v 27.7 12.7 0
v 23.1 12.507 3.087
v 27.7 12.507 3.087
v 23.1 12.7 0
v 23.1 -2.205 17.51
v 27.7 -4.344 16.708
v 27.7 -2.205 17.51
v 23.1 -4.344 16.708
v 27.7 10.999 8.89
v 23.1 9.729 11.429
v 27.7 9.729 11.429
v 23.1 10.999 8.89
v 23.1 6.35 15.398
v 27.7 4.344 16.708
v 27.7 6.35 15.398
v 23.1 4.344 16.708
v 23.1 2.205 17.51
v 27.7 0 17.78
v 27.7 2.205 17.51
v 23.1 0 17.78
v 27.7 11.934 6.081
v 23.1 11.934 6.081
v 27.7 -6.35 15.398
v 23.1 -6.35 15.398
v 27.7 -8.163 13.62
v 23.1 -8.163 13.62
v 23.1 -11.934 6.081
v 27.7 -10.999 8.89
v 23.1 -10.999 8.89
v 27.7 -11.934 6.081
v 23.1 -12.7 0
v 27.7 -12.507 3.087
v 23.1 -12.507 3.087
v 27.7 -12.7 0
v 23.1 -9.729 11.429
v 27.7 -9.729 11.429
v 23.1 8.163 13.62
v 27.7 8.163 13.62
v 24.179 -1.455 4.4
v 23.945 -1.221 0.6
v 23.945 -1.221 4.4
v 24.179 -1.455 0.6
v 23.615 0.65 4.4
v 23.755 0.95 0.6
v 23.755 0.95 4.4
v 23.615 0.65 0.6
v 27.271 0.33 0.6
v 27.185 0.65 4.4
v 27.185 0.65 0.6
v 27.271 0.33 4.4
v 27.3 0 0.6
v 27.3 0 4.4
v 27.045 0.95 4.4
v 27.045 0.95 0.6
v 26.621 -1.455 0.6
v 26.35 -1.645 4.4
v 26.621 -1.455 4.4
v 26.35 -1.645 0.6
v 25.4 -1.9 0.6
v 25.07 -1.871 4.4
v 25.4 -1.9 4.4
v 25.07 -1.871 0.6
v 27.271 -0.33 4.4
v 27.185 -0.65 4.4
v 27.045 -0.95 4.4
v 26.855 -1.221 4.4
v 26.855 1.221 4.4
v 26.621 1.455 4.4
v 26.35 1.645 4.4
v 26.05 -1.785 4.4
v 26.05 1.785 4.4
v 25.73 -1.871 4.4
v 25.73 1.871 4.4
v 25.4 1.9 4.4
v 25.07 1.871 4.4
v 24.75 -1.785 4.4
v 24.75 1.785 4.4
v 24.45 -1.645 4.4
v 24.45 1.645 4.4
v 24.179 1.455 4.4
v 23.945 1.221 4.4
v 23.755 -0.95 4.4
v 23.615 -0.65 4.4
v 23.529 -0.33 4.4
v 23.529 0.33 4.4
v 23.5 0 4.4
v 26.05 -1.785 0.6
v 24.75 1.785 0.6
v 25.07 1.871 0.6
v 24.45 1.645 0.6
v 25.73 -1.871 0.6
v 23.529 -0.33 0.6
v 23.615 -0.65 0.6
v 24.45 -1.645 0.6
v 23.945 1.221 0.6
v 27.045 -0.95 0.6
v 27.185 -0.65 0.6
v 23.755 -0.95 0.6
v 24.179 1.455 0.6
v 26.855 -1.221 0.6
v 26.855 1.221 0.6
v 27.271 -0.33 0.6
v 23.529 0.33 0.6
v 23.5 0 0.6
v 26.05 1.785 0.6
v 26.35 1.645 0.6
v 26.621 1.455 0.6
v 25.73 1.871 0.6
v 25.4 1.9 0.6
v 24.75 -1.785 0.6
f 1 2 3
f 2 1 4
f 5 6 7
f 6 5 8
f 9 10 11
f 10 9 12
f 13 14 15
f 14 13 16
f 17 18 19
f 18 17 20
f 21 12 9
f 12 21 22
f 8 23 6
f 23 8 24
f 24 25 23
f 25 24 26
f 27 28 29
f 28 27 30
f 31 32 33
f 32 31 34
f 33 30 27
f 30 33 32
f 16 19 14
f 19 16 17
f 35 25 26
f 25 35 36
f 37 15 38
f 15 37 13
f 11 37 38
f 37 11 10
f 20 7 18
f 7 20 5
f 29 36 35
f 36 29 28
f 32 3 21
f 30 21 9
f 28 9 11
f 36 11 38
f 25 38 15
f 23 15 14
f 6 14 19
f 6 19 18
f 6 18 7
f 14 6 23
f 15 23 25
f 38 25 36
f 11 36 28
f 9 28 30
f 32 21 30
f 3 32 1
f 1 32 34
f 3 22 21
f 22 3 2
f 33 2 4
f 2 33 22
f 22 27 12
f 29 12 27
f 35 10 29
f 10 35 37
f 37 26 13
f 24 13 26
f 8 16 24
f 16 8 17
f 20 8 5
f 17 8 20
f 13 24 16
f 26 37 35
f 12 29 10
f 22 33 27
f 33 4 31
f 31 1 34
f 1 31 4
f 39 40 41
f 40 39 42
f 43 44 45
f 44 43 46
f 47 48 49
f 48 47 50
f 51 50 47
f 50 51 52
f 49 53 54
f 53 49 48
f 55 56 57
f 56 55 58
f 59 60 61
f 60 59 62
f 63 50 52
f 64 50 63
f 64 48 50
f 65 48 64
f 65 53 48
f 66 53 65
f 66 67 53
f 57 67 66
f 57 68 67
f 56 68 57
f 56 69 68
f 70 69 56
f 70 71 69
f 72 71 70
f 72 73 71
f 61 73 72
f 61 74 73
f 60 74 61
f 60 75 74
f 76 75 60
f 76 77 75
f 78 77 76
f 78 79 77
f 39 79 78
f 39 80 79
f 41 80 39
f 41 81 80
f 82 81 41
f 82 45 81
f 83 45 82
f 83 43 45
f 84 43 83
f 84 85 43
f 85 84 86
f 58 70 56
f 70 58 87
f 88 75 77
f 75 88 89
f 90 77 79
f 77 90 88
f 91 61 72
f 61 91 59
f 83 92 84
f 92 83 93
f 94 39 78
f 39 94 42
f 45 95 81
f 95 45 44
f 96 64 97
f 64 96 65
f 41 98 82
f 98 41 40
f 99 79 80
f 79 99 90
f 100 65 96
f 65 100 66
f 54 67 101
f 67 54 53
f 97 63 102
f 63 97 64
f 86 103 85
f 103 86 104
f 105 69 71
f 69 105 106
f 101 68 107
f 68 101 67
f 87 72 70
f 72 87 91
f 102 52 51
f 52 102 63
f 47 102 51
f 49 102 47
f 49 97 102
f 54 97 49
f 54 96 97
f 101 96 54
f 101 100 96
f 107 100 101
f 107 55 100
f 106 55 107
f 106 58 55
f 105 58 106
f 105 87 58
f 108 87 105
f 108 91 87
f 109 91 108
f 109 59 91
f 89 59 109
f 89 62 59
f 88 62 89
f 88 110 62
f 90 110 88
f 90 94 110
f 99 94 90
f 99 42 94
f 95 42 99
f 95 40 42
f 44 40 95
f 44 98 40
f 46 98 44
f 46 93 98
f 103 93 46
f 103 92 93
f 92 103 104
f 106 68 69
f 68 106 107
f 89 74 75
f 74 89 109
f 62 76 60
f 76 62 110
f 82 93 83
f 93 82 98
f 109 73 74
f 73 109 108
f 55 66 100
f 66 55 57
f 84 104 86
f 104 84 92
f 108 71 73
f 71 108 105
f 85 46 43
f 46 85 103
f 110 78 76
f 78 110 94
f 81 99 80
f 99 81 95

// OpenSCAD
// file: cadence.scad
// cadence eaabadf.scad
// https://github.com/jmettraux/cadence.scad


// as of 2019.05, OpenSCAD understands
// is_num, is_list, is_string, and, is_bool
//
// is_function is coming, but looks tricky



function _normalize_angle(a) =
  ((a >= 0 && a <= 360) ? a : _normalize_angle(a + (a < 0 ? 360 : -360)));


function _is_point(p) =
  is_list(p) && len(p) == 3 && is_num(p.x) && is_num(p.y) && is_num(p.z);


//
// dictionary functions

function _aaget(dict, key, default, off) =
  let (kv = dict[off])
    kv == undef ? default :
    kv[0] == key ? kv[1] :
      _aaget(dict, key, default, off + 1);

function _asget(dict, key, default, off) =
  dict[off] == undef ? default :
  dict[off] == key ? dict[off + 1] :
    _asget(dict, key, default, off + 2);

function _get(dict, key, default=undef) =
  is_string(dict[0]) ?
    _asget(dict, key, default, 0) :
    _aaget(dict, key, default, 0);

function _del(dict, key) =
  [ for (kv = dict) if (kv[0] != key) kv ];

function _put(dict, key, value) =
  concat(_del(dict, key), [ [ key, value ] ]);


function _assoc(arr, key, default, off=0) =
  let (a = arr[off])
  a == undef ? default :
  a[0] == key ? a :
  _assoc(arr, key, default, off + 1);

function _app(arr, entry) =
  concat(_del(arr, entry[0]), [ entry ]);


//
// list functions

function _idx(list, index, default=undef) =
  let (
    i = index < 0 ? len(list) + index : index,
    r = list[i]
  )
  r == undef ? default : r;

  // sublist
  //
function _slist(list, from=0, to) =
  let(
    li = len(list) - 1,
    end = (to == undef ? li : to),
    a0 = from < 0 ? li + 1 + from : from,
    a = a0 < 0 ? 0 : a0,
    z = end < 0 ? li + 1 + end : end
  )
    a > li ? [] :
    z < a ? [] :
      [ for (i = [a:z]) list[i] ];

function _reverse(list) =
  [ for (i = [ len(list) - 1 : -1 : 0 ]) list[i] ];


//
// string functions

function _sstr(s, from=0, length=undef, r="") =
  let(
    i = from < 0 ? len(s) + from : from,
    l = length == undef ? len(s) : length,
    s0 = s[i]
  )
  (s0 == undef || l < 1) ? r :
  str(r, s[i], _sstr(s, i + 1, l - 1));

function _sindex(s, s1, i=0) =
  let(
    l = len(s1),
    s0 = _sstr(s, i, l)
  )
  len(s0) < l ? undef :
  s0 == s1 ? i :
  _sindex(s, s1, i + 1);


function _ends_with(l, l1)=
  is_string(l) ? (_sstr(l, len(l) - len(l1)) == l1) :
  is_list(l) ? (_slist(l, len(l) - len(l1)) == l1) :
  false;


//
// point functions

  // Accept a single angle instead of [ angle0, angle1 ]
  // 'sp' is the start point
  //
function _to_point(length, angles, sp=[ 0, 0, 0 ]) =
  let(
    as = is_num(angles) ? [ angles, 0 ] : angles,
    inclination = as[0],
    azimuth = as[1] + 90
  )
    sp + [
      length * cos(inclination) * cos(azimuth),
      length * cos(inclination) * sin(azimuth),
      length * sin(inclination) ];

function _to_spherical(point) =
  let(
    l = norm(point),
    ele = asin(point.z / l),
    dir = atan2(point.y, point.x) - 90
  )
    [ l, [ ele, dir ] ];

function _to_spherical_xyz(point) =
  let(
    l = norm(point),
    ele = asin(point.z / l),
    dir = atan2(point.y, point.x) - 90
  )
    [ l, ele, dir ];

function _to_ele_dir(point) =
  let(
    ele = asin(point.z / l),
    dir = atan2(point.y, point.x) - 90
  )
    [ ele, dir ];


function _midpoint(p0, p1, ratio=0.5) =
  let(
    s = _to_spherical(p1 - p0)
  )
    _to_point(ratio * s[0], s[1], p0);

//function _vlen(vector) =
//  sqrt(pow(vector.x, 2) + pow(vector.y, 2) + pow(vector.z, 2));
  //
  // no, use norm(vector)


// Like rotate(rotation) { x }, but as a function, applied to a single point
//
function rotate_point(point, rotation)=
  let (
    r = rotation,
    m =
      [ [ 1, 0, 0 ], [0, cos(r.x), -sin(r.x) ], [ 0, sin(r.x), cos(r.x) ] ] *
      [ [ cos(r.y), 0, sin(r.y) ], [ 0, 1, 0 ], [ -sin(r.y), 0, cos(r.y) ] ] *
      [ [ cos(r.z), -sin(r.z), 0 ], [ sin(r.z), cos(r.z), 0 ], [ 0, 0, 1 ] ]
  )
  m * point;


// inspiration:
// https://climberg.de/post/openscad_bezier_curves_of_any_degrees

function _bezier_choose(n, k) =
  k == 0 ?  1 : (n * _bezier_choose(n - 1, k - 1)) / k;

function _bezier_point(points, t, i, c) =
  len(points) == i ?
    c :
    _bezier_point(
      points,
      t,
      i + 1,
      c +
        _bezier_choose(len(points) - 1, i) *
        pow(t, i) *
        pow(1 - t, len(points) - i - 1) * points[i]);

function _bezier_points(control_points, sample_count) =
  [ for (t = [ 0 : 1.0 / sample_count : 1 ])
    _bezier_point(control_points, t, 0, [ 0, 0, 0 ]) ];


//
// modules

module polypoints(points) {

  for (i = [ 0 : len(points) - 1 ]) {
    translate(points[i]) children(i % $children);
  }
}

module polyhulls(points) {

  for (i = [ 0 : len(points) - 2 ]) {

    hull() {
      translate(points[i]) children(i % $children);
      translate(points[i + 1]) children((i + 1) % $children);
    }
  }
}


// pineapple slice
//
module paslice(radius, depth, slice=45, radius1=0) {

  s = _normalize_angle(slice);
  r = radius;

  if (s > 0) difference() {

    cylinder(depth, r=r);

    translate([ 0, 0, -0.1 ]) cylinder(depth * 1.1, r=radius1);

    if (s != 360) {

      pas = [
        [ 0, r ], [ 0, 0 ] ];
      pbs = [
        [ r, r ], [ r, 0 ], [ r, -r ], [ 0, -r ], [ -r, -r ], [ -r, 0 ],
        [ -r, r ] ];

      t = tan(s);
      tx = t * r;
      ty = r / t;

      translate([ 0, 0, -0.1 ]) linear_extrude(depth + 0.2)
        if (s <= 45)
          polygon(concat(pas, [ [ tx, r ] ], pbs));
        else if (s <= 135)
          polygon(concat(pas, [ [ r, ty ] ], _slist(pbs, 2)));
        else if (s <= 225)
          polygon(concat(pas, [ [ -tx, -r ] ], _slist(pbs, 4)));
        else if (s <= 315)
          polygon(concat(pas, [ [ -r, -ty ] ], _slist(pbs, 6)));
        else if (s < 360)
          polygon(concat(pas, [ [ tx, r ] ]));
    }
  }
}


// dome with optional trunk_height
//
module dome(radius=-1, diameter=-1, trunk_height=0) {

  r = radius < 0 ? diameter / 2 : radius;
  th = trunk_height;

  translate([ 0, 0, th ])
    difference() {
      sphere(r=r);
      translate([ 0, 0, -r ]) cube(2 * r, center=true);
    }
  translate([ 0, 0, th / 2 ])
    cylinder(r=r, h=th, center=true);
}
// main file
//
// coverage.scad
//

use <cadence.scad>;

// unit is mm

inch = 25.4;
o2 = 0.2;
bd = 5; // ball diameter

br = bd / 2;
td = 2 * bd; // trunk diameter
in2 = inch / 2;
k0 = bd + 2 * o2;
k1 = bd + td / 2 + 2 * o2;

rr = inch / 20;

module bal() { sphere(r=rr, $fn=12); }
//module notch() { paslice(k1, k0, slice=60); }

module balcyl(deeper=false) {

  h = deeper ? br * 2.8 + o2 : br * 2 + o2;
  dz = deeper ? -3 * o2 : 0;

  translate([ 0, 0, dz + h / 2  ])
    cylinder(r=br + 2 * o2, h=h, center=true, $fn=36);
}

module trunk(height, reach=inch / 2.1) {

  module root() {

    translate([ 0, 0, -0.4 ]) {

      ps = [
        [ reach, 0, 0 ], [ reach / 4, 0, reach/ 4 ], [ td / 2.8, 0, reach ] ];
      ps1 = _bezier_points(ps, 8);
      polyhulls(ps1) { bal(); }

      for (i = [ 0 : len(ps1) - 2 ])
        hull() {
          translate(ps1[i]) bal();
          translate(ps1[i + 1]) bal();
          translate([ 0, -bd / 2, 0 ]) bal();
          translate([ 0, bd / 2, 0 ]) bal();
        }
    }
  }

  difference() {

    union() {
      cylinder(d=td, h=height, $fn=8); // trunk
      for (a = [ 0 : 90 : 270 ]) rotate([ 0, 0, a ]) root();
    }

    translate([ 0, 0, -10 / 2 ])
      cube(size=[ 2 * inch, 2 * inch, 10 ], center=true);

    translate([ 0, 0, 2 * o2 ]) balcyl();
    //translate([ 0, 0, height - br * 2.8 - 2 * o2 ]) balcyl(true);
  }
}

module pyramidal(diameter, height) {

  r = diameter / 2;
  td1 = td + 3 * o2;

  difference() {
    hull()
      union() {
        translate([ 0, 0, height ]) bal();
        for (a = [ 0 : 60 : 300 ]) {
          rotate([ 0, 0, a ]) translate([ 0, r - rr, rr ]) bal();
        }
      }
    #translate([ 0, 0, - o2 ]) cylinder(d=td1, h=inch + o2, $fn=36);
  }
}

//pyramidal(1.4 * inch, 2.8 * inch);

module conical(diameter, height, hratio1=0.25, hratio2=0.25) {

  r = diameter / 2;
  td1 = td + 3 * o2;
  r0 = td1 / 2 + 2 * o2;
  h1 = height * hratio1;
  h2 = height * hratio2;

  difference() {
    hull()
      union() {
        for(a = [ 0 : 60 : 300 ]) {
          rotate([ 0, 0, a ]) translate([ r0, 0, rr ]) bal();
          rotate([ 0, 0, a ]) translate([ r, 0, h1 ]) bal();
          if (h2 != h1) rotate([ 0, 0, a ]) translate([ r, 0, h2 ]) bal();
        }
        translate([ 0, 0, height ]) bal();
      }
    #translate([ 0, 0, - o2 ]) cylinder(d=td1, h=inch + o2, $fn=36);
  }
}

//conical(1.4 * inch, 3.5 * inch, 0.14, 0.42);
//conical(1.4 * inch, 3.5 * inch, 0.14, 0.14);

//trunk((-0.49 + 1) * inch);

module bush(height=1.2) {
  bd = 3;
  difference() {
    rotate([ 0, -90, 0 ])
      scale([ height, 1, 1 ])
        cylinder(d=inch, h=bd + 8 * o2, $fn=36, center=true);
    translate([ 0, 0, -inch / 2 ])
      cube(size=[ inch, inch, inch ], center=true);
    #translate([ 0, 0, (bd + 4 * o2) / 2 + 3 * o2 ])
      cylinder(d=bd + 4 * o2, h=bd + 4 * o2, $fn=36, center=true);
  }
}

//translate([ -2 * inch, 0, 0 ]) bush(0.9);
//translate([ -inch, 0, 0 ]) bush(1.1);
//bush();
translate([ inch, 0, 0 ]) bush(1.4);
